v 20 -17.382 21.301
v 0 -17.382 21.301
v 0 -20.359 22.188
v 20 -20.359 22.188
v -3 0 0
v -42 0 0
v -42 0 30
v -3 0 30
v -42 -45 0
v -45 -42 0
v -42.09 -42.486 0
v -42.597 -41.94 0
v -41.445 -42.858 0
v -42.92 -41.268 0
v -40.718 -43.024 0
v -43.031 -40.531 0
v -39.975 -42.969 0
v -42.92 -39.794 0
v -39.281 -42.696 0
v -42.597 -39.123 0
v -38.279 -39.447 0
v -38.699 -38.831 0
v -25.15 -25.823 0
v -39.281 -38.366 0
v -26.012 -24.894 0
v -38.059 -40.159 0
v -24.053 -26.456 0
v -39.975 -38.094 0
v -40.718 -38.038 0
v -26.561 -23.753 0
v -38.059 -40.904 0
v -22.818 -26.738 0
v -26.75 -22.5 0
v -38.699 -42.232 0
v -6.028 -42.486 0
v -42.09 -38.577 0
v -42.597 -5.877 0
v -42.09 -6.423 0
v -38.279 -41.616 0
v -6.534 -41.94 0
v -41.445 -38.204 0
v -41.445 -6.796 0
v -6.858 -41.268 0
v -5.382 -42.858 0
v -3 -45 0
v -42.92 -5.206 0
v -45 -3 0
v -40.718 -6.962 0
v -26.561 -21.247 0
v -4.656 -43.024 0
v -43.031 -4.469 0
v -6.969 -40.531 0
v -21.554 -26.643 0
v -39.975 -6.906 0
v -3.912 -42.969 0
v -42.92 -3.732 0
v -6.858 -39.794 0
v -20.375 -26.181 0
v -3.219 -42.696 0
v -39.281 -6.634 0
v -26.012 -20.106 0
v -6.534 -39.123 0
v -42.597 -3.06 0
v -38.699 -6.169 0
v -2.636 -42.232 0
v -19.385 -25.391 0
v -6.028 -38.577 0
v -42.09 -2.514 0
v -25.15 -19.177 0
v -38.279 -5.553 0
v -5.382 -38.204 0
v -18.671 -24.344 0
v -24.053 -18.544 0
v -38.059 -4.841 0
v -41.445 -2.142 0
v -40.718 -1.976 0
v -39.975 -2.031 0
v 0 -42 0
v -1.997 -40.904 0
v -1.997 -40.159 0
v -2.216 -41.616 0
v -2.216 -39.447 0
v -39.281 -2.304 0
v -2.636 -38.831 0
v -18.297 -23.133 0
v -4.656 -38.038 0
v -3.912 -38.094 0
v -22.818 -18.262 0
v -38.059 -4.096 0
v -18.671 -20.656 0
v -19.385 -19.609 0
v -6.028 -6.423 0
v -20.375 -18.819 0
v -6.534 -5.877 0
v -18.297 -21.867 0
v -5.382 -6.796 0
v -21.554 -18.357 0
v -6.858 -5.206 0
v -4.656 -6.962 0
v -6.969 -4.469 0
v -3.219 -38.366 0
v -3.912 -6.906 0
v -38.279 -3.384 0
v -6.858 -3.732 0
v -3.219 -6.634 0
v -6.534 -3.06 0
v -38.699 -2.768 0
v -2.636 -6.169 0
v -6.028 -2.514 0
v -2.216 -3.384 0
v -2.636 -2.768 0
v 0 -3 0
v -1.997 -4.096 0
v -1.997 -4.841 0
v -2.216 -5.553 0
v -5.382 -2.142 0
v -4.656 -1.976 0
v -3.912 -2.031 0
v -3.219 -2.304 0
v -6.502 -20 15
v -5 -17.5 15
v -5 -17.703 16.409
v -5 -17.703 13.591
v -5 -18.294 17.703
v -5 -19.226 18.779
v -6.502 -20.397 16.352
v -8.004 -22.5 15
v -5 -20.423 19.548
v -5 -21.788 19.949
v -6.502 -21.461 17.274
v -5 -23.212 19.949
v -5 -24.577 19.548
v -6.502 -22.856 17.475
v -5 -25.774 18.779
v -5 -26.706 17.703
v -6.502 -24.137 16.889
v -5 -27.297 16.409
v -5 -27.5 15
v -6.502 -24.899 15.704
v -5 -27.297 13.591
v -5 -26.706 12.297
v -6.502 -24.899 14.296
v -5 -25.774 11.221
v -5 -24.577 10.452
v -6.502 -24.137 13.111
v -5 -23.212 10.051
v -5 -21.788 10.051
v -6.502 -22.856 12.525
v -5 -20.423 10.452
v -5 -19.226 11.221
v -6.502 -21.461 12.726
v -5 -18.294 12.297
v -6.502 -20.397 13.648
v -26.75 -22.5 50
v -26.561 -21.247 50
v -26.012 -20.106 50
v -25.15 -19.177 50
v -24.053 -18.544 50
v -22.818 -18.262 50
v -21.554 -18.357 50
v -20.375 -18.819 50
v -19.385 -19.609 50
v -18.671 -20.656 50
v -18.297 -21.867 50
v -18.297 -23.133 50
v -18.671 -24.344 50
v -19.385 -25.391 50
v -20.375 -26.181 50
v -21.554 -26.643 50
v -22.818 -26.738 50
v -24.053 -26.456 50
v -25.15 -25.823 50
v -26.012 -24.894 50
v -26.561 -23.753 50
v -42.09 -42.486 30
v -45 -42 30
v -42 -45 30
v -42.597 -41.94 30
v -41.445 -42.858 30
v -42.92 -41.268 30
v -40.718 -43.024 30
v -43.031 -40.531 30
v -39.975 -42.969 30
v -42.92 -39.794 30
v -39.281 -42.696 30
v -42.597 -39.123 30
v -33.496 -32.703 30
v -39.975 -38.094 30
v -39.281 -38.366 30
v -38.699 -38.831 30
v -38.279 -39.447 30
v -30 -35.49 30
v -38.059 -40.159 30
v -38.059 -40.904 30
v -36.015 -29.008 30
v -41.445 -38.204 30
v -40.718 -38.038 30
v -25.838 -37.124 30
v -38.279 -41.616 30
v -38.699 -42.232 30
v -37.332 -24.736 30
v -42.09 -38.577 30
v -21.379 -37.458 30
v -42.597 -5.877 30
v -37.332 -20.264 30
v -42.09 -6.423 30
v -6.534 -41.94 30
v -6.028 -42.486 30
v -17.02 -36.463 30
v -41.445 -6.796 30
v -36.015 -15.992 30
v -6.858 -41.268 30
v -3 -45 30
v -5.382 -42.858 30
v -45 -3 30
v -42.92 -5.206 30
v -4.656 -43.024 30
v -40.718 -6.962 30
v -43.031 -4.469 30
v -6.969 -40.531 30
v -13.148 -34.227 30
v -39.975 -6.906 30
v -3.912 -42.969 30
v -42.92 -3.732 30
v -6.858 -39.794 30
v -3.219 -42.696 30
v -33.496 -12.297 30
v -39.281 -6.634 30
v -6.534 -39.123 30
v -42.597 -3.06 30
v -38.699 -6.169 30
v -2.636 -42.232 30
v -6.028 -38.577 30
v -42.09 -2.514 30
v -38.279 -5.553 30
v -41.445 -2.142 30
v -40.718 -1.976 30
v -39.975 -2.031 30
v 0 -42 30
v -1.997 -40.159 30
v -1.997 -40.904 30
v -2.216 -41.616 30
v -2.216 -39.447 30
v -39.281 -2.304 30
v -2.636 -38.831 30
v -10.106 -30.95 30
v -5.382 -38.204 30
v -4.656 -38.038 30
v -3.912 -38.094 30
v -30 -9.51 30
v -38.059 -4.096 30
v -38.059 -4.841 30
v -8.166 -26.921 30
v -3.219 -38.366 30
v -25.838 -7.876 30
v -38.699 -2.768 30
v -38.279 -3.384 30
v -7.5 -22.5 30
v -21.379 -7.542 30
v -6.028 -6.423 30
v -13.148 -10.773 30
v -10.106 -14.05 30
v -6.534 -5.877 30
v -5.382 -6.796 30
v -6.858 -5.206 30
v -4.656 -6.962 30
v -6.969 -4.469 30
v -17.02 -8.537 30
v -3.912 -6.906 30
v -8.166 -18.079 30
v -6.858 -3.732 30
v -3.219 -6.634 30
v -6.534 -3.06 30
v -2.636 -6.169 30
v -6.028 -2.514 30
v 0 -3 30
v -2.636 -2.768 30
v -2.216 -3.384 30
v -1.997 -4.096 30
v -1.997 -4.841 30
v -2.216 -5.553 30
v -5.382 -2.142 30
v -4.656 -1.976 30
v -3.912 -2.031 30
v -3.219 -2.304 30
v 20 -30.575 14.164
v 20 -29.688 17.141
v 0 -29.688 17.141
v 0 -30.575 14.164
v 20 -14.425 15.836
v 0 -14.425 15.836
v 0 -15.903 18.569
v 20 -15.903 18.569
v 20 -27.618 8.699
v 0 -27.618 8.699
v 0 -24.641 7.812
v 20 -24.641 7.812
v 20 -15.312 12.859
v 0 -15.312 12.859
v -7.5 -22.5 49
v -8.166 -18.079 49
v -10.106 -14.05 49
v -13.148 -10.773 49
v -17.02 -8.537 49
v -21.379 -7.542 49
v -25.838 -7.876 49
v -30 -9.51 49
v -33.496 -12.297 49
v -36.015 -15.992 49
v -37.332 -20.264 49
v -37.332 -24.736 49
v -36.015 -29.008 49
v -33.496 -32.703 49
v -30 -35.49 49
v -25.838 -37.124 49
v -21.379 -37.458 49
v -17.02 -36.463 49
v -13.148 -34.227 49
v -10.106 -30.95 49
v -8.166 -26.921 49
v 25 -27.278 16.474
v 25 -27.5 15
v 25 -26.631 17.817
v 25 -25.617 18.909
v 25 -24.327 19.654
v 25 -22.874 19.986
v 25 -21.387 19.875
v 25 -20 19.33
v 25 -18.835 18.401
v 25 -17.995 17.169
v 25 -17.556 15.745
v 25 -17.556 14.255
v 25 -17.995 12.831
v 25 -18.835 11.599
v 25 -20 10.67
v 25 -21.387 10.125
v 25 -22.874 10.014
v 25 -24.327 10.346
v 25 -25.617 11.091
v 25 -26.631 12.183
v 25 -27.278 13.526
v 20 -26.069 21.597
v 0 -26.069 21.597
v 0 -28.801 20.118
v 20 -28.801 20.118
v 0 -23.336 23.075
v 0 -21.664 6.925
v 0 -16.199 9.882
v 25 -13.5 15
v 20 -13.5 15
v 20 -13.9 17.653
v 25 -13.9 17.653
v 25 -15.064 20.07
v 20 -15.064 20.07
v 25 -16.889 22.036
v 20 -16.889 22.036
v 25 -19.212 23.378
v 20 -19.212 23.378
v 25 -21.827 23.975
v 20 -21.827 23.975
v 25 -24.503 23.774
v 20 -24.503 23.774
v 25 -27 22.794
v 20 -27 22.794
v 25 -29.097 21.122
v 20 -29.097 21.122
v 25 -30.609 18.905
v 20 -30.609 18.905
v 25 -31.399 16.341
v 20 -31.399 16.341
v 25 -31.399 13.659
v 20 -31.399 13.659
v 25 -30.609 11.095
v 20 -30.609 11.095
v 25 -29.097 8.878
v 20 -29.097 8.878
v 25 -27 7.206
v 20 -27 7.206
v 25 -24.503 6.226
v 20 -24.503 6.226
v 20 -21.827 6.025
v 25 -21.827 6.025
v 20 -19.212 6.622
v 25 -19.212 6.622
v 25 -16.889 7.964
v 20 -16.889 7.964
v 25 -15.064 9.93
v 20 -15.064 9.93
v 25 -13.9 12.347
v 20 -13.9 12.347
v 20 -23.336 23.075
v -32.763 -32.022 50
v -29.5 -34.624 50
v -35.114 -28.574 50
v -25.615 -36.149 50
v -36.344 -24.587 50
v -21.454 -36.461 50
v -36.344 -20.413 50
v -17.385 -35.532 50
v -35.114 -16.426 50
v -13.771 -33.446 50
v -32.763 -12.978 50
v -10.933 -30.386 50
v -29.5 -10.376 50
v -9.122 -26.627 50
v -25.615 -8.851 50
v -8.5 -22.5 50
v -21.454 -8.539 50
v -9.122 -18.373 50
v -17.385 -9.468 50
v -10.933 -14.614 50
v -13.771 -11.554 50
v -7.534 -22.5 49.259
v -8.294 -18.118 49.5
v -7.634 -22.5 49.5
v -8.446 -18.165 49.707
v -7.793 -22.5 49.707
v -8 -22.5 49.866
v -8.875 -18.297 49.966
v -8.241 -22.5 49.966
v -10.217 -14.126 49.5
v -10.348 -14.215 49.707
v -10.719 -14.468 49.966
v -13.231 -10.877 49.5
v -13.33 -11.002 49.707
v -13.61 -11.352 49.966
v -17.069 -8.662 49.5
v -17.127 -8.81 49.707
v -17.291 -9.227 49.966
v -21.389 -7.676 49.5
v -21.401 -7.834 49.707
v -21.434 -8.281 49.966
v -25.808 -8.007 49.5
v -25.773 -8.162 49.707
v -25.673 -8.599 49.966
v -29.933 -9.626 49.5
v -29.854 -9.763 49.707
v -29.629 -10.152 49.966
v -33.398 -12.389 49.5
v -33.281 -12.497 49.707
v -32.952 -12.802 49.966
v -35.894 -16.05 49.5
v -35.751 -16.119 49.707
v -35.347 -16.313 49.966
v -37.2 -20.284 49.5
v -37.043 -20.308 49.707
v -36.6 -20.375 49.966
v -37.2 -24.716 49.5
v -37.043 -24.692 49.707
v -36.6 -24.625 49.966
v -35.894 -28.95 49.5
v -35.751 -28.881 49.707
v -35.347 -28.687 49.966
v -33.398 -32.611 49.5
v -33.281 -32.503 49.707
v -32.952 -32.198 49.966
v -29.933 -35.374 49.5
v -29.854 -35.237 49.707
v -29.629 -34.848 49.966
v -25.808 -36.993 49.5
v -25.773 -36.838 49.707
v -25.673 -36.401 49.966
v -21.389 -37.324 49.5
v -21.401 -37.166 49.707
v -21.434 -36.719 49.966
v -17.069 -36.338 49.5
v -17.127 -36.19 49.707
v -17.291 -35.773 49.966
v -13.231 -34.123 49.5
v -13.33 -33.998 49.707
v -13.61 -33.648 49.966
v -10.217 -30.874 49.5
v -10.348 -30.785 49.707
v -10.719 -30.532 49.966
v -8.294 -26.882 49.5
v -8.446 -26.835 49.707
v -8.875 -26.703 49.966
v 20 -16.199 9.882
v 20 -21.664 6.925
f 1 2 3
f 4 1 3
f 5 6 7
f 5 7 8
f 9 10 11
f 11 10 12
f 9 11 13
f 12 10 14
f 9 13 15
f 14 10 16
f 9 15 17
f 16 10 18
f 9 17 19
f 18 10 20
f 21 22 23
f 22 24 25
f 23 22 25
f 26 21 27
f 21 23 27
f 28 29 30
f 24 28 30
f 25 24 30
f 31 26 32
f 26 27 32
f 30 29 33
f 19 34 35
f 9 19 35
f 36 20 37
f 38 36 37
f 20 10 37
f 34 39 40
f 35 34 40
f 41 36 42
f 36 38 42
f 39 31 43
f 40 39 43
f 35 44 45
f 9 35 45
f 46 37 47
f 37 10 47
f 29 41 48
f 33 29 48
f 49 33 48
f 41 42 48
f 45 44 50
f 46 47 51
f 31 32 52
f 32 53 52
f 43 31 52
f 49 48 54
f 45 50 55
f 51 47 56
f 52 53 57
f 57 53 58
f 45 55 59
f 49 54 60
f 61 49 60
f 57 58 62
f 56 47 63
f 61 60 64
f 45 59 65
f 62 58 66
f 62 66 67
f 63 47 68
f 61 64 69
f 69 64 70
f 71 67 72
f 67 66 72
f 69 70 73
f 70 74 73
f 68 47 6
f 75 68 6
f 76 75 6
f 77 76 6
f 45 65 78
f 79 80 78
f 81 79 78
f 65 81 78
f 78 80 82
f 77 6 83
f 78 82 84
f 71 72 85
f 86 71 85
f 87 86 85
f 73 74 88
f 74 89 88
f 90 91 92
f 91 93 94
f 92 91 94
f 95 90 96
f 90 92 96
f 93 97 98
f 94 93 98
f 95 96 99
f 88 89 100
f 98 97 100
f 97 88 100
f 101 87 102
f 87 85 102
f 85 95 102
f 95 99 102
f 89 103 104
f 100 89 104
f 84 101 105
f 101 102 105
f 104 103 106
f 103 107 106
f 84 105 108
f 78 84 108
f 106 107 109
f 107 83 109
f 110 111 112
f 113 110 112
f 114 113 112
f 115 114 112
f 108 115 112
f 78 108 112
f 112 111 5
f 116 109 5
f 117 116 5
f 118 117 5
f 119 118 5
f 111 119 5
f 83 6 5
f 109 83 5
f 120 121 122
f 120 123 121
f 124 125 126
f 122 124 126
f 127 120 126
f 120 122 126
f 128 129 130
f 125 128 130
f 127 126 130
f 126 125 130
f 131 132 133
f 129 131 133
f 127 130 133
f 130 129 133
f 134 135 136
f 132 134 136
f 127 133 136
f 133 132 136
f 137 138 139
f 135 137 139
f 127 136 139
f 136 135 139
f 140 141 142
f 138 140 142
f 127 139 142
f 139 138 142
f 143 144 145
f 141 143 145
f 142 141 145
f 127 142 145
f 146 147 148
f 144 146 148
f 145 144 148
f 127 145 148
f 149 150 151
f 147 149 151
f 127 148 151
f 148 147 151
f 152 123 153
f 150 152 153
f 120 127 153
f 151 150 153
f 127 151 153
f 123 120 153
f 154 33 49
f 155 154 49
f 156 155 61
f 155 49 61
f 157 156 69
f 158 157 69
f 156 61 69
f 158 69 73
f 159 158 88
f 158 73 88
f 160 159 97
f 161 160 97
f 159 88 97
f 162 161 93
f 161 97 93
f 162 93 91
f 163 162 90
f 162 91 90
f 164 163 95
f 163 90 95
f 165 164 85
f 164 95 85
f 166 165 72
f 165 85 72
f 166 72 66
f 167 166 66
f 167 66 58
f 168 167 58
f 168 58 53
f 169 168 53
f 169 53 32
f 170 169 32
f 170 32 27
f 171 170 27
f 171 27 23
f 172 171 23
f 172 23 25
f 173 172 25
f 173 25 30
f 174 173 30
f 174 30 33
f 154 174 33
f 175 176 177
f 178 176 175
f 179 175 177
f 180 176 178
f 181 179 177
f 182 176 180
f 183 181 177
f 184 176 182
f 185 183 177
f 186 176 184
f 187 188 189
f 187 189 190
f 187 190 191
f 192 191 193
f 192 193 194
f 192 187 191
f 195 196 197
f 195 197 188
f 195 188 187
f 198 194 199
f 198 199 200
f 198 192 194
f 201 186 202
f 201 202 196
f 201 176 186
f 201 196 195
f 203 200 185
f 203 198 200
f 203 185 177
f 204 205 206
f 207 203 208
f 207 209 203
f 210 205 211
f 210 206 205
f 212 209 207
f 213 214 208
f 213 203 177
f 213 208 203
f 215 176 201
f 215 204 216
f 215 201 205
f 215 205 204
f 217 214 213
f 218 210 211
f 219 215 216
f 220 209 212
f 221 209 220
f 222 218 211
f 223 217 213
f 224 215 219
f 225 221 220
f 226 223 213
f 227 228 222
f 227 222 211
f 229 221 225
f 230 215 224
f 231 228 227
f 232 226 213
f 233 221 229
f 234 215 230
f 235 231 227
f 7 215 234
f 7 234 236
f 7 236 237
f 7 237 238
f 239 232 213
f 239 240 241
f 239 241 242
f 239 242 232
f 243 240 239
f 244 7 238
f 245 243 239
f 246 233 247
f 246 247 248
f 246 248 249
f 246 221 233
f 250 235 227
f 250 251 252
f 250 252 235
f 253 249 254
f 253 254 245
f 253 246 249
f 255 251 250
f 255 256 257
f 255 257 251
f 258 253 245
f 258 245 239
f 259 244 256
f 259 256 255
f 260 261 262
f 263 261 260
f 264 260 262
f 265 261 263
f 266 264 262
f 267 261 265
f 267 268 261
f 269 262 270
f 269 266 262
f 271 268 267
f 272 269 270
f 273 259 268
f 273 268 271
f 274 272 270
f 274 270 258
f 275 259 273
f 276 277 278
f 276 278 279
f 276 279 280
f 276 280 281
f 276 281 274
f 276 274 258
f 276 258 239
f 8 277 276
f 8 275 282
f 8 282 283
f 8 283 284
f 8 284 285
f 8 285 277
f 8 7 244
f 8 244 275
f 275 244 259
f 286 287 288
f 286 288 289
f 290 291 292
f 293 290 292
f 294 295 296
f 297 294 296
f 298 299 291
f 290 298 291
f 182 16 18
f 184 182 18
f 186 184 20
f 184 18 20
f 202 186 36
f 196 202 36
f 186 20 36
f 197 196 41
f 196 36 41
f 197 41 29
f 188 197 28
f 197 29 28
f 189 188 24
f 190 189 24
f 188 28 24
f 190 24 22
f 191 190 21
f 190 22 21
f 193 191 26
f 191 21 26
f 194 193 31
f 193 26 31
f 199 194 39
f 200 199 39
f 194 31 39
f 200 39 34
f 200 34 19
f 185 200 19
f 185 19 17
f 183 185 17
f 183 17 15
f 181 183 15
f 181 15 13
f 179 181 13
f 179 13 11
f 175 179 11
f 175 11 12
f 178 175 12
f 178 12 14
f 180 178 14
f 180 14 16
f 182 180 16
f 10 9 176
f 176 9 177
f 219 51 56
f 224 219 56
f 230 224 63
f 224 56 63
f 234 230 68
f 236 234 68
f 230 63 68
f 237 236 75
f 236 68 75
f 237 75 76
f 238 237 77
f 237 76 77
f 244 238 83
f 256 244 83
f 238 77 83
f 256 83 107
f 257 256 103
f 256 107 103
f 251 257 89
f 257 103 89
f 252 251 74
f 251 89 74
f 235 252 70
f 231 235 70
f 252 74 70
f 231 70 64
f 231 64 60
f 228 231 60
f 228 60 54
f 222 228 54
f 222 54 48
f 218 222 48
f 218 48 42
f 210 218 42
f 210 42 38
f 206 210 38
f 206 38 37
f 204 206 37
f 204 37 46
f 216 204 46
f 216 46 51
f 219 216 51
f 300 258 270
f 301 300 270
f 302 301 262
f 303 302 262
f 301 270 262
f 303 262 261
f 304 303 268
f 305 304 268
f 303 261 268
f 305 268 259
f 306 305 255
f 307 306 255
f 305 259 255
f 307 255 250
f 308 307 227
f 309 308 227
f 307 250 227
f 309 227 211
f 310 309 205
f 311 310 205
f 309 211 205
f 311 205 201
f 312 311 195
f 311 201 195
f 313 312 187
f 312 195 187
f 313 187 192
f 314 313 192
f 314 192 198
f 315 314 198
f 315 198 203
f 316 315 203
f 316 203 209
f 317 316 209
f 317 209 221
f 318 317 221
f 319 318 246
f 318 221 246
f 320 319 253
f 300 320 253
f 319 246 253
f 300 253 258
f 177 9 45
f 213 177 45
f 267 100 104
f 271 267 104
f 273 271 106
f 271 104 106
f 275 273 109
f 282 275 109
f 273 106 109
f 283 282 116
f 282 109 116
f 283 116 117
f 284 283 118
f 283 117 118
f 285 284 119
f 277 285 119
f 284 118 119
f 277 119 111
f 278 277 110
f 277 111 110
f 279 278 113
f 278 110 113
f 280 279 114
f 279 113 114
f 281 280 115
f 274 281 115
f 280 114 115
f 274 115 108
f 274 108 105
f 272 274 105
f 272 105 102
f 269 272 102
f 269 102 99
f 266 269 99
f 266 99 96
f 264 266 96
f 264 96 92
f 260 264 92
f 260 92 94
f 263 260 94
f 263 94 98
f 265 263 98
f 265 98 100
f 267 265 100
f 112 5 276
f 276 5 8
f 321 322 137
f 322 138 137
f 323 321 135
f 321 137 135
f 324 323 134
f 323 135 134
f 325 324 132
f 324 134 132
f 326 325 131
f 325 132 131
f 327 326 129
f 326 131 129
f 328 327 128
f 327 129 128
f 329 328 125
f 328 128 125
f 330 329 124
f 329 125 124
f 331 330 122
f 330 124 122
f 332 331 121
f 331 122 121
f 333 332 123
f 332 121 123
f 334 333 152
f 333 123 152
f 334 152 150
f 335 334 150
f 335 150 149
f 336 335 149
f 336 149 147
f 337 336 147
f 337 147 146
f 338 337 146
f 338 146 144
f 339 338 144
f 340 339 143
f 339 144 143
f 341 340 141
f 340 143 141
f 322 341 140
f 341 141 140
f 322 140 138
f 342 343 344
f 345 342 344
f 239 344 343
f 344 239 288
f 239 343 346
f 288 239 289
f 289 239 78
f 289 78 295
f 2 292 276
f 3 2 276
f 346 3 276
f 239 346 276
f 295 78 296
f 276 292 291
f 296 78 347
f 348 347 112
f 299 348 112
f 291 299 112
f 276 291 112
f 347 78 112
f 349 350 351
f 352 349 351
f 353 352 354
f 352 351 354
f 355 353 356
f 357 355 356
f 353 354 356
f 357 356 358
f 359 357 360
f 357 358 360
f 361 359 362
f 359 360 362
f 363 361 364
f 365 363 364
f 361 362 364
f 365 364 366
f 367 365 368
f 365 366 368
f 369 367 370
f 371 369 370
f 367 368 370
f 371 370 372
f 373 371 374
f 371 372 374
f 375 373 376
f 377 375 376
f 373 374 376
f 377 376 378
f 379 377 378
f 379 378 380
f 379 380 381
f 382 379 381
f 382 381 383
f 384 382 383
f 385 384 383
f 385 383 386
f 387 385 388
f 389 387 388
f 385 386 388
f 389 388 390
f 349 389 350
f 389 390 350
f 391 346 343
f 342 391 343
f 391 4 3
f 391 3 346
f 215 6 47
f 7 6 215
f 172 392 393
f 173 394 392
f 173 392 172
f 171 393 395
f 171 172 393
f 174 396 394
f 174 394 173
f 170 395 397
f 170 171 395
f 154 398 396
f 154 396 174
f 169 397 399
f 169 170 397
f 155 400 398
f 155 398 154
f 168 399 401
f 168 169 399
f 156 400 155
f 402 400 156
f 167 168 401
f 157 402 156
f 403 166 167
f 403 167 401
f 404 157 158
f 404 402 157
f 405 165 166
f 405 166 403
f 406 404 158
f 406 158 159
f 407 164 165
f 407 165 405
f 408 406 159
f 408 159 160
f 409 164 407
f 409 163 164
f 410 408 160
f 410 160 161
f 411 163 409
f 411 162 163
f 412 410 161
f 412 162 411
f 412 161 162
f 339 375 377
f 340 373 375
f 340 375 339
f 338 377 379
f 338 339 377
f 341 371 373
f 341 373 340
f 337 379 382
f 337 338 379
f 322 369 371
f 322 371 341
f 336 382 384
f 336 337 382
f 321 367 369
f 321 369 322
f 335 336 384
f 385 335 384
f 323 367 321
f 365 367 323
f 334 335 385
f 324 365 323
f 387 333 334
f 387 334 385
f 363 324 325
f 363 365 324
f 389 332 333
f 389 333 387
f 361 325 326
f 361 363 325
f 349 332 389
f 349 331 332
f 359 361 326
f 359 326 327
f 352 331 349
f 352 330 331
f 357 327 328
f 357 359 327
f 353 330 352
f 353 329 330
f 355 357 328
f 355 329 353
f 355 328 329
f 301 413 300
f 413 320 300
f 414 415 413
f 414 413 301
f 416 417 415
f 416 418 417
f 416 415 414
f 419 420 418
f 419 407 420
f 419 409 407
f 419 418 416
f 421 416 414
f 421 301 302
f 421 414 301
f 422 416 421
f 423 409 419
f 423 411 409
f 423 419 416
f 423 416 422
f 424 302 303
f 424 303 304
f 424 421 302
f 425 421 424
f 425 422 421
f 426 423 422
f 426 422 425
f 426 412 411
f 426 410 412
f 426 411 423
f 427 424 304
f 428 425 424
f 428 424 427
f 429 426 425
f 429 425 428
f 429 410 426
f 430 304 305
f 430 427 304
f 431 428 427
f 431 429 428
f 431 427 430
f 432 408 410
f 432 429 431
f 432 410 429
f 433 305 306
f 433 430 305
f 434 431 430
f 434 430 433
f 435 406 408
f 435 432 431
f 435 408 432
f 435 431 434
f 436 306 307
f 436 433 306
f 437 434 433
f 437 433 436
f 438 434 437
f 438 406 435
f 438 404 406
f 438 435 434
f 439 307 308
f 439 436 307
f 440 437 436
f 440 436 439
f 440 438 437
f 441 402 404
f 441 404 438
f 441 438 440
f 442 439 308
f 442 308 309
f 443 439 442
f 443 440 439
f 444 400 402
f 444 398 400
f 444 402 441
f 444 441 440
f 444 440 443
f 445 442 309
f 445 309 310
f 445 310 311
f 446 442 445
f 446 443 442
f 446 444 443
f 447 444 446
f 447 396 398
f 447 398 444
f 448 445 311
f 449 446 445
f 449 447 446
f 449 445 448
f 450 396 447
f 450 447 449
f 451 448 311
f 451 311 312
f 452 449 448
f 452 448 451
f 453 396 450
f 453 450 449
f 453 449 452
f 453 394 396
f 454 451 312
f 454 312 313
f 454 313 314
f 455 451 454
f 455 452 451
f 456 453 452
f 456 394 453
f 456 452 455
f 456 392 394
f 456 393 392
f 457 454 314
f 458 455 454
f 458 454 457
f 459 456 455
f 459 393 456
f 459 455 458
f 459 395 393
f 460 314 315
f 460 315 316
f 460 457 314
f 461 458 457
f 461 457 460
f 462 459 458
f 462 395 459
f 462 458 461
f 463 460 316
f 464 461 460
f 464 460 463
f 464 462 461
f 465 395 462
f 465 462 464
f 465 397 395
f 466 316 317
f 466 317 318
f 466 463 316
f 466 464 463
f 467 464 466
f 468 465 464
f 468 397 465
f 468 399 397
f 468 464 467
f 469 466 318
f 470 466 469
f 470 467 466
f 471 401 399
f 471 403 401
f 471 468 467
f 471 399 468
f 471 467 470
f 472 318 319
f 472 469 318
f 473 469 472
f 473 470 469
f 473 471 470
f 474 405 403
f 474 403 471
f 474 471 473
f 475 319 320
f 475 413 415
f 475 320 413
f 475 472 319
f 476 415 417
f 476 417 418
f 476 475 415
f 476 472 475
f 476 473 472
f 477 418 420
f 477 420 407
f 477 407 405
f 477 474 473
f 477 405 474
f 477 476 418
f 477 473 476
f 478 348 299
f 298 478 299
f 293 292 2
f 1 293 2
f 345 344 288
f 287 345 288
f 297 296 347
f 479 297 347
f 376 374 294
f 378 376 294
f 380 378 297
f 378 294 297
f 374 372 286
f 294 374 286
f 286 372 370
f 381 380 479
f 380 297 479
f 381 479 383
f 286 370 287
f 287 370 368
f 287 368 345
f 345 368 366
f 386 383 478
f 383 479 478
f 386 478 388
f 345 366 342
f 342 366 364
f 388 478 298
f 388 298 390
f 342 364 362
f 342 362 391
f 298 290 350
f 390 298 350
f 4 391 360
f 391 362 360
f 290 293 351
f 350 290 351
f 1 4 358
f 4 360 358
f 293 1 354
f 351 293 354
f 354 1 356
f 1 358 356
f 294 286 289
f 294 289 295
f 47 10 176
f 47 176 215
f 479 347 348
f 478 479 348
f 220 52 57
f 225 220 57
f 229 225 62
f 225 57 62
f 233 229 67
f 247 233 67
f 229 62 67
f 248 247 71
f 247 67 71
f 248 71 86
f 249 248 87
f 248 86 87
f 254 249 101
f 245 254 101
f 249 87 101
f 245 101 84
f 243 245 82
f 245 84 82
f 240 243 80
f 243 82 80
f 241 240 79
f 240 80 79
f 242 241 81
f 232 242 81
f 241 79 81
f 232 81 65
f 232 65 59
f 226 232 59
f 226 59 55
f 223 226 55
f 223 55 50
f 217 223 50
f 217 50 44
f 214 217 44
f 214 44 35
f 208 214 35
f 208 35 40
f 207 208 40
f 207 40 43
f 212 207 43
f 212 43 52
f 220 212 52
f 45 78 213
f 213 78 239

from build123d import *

# Parameters (mm, degrees)
F0_W      = 45
F0_H      = 45
F1_DEPTH  = 30
F2_SIZE   = 3
F4_D      = 5
F6_DEPTH  = 20
F7_R      = 9
F8_DEPTH  = 5
F10_D     = 10
F10_DEPTH = 30
F10_TIP   = 3.0043030951
F11_R     = 15
F12_DEPTH = 20
F13_R     = 1
F15_D     = 8.5


with BuildPart() as f1:
    # F0 (on Top) → F1 (new body)
    with BuildSketch(Plane.XY):
        with Locations((-22.5, -22.5)):
            Rectangle(F0_W, F0_H)
    extrude(amount=F1_DEPTH)

    # F2
    f2_edges = [f1.edges().sort_by_distance(p)[0] for p in [
        (-45, -45, 15),
        (0, -45, 15),
        (0, 0, 15),
        (-45, 0, 15),
    ]]
    chamfer(f2_edges, length=F2_SIZE)

    # F4 (through all)
    with Locations(Plane.XY.offset(30)):
        with Locations((-40.5312229203, -40.5312229203), (-40.5312229203, -4.4687770797), (-4.4687770797, -4.4687770797), (-4.4687770797, -40.5312229203)):
            Hole(F4_D / 2)

    # F5 (on face) → F6 (join)
    with BuildSketch(Plane.YZ):
        with BuildLine():
            ThreePointArc((-15.3121332332, 12.8588387864), (-15.0784435342, 13.9181036905), (-15, 15))
            ThreePointArc((-15, 15), (-15.2293520832, 16.8405648237), (-15.903381032, 18.5685596803))
            ThreePointArc((-15.903381032, 18.5685596803), (-17.7711474831, 20.8213360901), (-20.3588389028, 22.1878668015))
            ThreePointArc((-20.3588389028, 22.1878668015), (-23.2725024385, 22.4601099176), (-26.0685594955, 21.5966190679))
            ThreePointArc((-26.0685594955, 21.5966190679), (-28.3213359619, 19.7288526747), (-29.6878667454, 17.1411612856))
            ThreePointArc((-29.6878667454, 17.1411612856), (-29.9601099219, 14.2274976035), (-29.0966190145, 11.4314404058))
            ThreePointArc((-29.0966190145, 11.4314404058), (-27.2288526423, 9.1786640118), (-24.6411613131, 7.8121332628))
            ThreePointArc((-24.6411613131, 7.8121332628), (-21.7274976178, 7.5398900766), (-18.9314404058, 8.4033809855))
            ThreePointArc((-18.9314404058, 8.4033809855), (-16.6786639791, 10.271147398), (-15.3121332332, 12.8588387864))
        make_face()
        with BuildLine():
            ThreePointArc((-15.903381032, 18.5685596803), (-15.2293520832, 16.8405648237), (-15, 15))
            ThreePointArc((-15, 15), (-15.0784435342, 13.9181036905), (-15.3121332332, 12.8588387864))
            Line((-15.3121332332, 12.8588387864), (-14.4252352272, 15.8361507619))
            Line((-14.4252352272, 15.8361507619), (-15.903381032, 18.5685596803))
        make_face()
        with BuildLine():
            ThreePointArc((-20.3588389028, 22.1878668015), (-17.7711474831, 20.8213360901), (-15.903381032, 18.5685596803))
            Line((-15.903381032, 18.5685596803), (-17.3815269465, 21.3009688012))
            Line((-17.3815269465, 21.3009688012), (-20.3588389028, 22.1878668015))
        make_face()
        with BuildLine():
            Line((-16.1990311988, 9.8815269465), (-15.3121332332, 12.8588387864))
            ThreePointArc((-15.3121332332, 12.8588387864), (-16.6786639791, 10.271147398), (-18.9314404058, 8.4033809855))
            Line((-18.9314404058, 8.4033809855), (-16.1990311988, 9.8815269465))
        make_face()
        with BuildLine():
            ThreePointArc((-26.0685594955, 21.5966190679), (-23.2725024385, 22.4601099176), (-20.3588389028, 22.1878668015))
            Line((-20.3588389028, 22.1878668015), (-23.3361507619, 23.0747647728))
            Line((-23.3361507619, 23.0747647728), (-26.0685594955, 21.5966190679))
        make_face()
        with BuildLine():
            Line((-21.6638492381, 6.9252352272), (-18.9314404058, 8.4033809855))
            ThreePointArc((-18.9314404058, 8.4033809855), (-21.7274976178, 7.5398900766), (-24.6411613131, 7.8121332628))
            Line((-24.6411613131, 7.8121332628), (-21.6638492381, 6.9252352272))
        make_face()
        with BuildLine():
            ThreePointArc((-29.6878667454, 17.1411612856), (-28.3213359619, 19.7288526747), (-26.0685594955, 21.5966190679))
            Line((-26.0685594955, 21.5966190679), (-28.8009688012, 20.1184730535))
            Line((-28.8009688012, 20.1184730535), (-29.6878667454, 17.1411612856))
        make_face()
        with BuildLine():
            Line((-27.6184730535, 8.6990311988), (-24.6411613131, 7.8121332628))
            ThreePointArc((-24.6411613131, 7.8121332628), (-27.2288526423, 9.1786640118), (-29.0966190145, 11.4314404058))
            Line((-29.0966190145, 11.4314404058), (-27.6184730535, 8.6990311988))
        make_face()
        with BuildLine():
            ThreePointArc((-29.0966190145, 11.4314404058), (-29.9601099219, 14.2274976035), (-29.6878667454, 17.1411612856))
            Line((-29.6878667454, 17.1411612856), (-30.5747647728, 14.1638492381))
            Line((-30.5747647728, 14.1638492381), (-29.0966190145, 11.4314404058))
        make_face()
    extrude(amount=F6_DEPTH)

    # F7 (on face) → F8 (join)
    with BuildSketch(Plane.YZ.offset(20)):
        with Locations((-22.5, 15)):
            Circle(F7_R)
        Polygon((-29.687866787, 17.1411611458), (-22.5, 15), (-24.6411611458, 7.812133213), align=None, mode=Mode.SUBTRACT)
        Polygon((-24.6411611458, 7.812133213), (-22.5, 15), (-29.687866787, 17.1411611458), align=None)
    extrude(amount=F8_DEPTH)

    # F10
    with Locations(Plane.YZ.offset(25)):
        with Locations((-22.5, 15)):
            Hole(F10_D / 2, depth=F10_DEPTH)
            with Locations((0, 0, -(F10_DEPTH + F10_TIP / 2))):  # 118° drill point
                Cone(0, F10_D / 2, F10_TIP, mode=Mode.SUBTRACT)

    # F11 (on face) → F12 (join)
    with BuildSketch(Plane.XY.offset(30)):
        with Locations((-22.5, -22.5)):
            Circle(F11_R)
    extrude(amount=F12_DEPTH)

    # F13
    f13_edges = [f1.edges().sort_by_distance(p)[0] for p in [
        (-37.5, -22.5, 50),
    ]]
    fillet(f13_edges, radius=F13_R)

    # F15 (through all)
    with Locations(Plane.XY.offset(50)):
        with Locations((-22.5, -22.5)):
            Hole(F15_D / 2)


solid = f1.part
